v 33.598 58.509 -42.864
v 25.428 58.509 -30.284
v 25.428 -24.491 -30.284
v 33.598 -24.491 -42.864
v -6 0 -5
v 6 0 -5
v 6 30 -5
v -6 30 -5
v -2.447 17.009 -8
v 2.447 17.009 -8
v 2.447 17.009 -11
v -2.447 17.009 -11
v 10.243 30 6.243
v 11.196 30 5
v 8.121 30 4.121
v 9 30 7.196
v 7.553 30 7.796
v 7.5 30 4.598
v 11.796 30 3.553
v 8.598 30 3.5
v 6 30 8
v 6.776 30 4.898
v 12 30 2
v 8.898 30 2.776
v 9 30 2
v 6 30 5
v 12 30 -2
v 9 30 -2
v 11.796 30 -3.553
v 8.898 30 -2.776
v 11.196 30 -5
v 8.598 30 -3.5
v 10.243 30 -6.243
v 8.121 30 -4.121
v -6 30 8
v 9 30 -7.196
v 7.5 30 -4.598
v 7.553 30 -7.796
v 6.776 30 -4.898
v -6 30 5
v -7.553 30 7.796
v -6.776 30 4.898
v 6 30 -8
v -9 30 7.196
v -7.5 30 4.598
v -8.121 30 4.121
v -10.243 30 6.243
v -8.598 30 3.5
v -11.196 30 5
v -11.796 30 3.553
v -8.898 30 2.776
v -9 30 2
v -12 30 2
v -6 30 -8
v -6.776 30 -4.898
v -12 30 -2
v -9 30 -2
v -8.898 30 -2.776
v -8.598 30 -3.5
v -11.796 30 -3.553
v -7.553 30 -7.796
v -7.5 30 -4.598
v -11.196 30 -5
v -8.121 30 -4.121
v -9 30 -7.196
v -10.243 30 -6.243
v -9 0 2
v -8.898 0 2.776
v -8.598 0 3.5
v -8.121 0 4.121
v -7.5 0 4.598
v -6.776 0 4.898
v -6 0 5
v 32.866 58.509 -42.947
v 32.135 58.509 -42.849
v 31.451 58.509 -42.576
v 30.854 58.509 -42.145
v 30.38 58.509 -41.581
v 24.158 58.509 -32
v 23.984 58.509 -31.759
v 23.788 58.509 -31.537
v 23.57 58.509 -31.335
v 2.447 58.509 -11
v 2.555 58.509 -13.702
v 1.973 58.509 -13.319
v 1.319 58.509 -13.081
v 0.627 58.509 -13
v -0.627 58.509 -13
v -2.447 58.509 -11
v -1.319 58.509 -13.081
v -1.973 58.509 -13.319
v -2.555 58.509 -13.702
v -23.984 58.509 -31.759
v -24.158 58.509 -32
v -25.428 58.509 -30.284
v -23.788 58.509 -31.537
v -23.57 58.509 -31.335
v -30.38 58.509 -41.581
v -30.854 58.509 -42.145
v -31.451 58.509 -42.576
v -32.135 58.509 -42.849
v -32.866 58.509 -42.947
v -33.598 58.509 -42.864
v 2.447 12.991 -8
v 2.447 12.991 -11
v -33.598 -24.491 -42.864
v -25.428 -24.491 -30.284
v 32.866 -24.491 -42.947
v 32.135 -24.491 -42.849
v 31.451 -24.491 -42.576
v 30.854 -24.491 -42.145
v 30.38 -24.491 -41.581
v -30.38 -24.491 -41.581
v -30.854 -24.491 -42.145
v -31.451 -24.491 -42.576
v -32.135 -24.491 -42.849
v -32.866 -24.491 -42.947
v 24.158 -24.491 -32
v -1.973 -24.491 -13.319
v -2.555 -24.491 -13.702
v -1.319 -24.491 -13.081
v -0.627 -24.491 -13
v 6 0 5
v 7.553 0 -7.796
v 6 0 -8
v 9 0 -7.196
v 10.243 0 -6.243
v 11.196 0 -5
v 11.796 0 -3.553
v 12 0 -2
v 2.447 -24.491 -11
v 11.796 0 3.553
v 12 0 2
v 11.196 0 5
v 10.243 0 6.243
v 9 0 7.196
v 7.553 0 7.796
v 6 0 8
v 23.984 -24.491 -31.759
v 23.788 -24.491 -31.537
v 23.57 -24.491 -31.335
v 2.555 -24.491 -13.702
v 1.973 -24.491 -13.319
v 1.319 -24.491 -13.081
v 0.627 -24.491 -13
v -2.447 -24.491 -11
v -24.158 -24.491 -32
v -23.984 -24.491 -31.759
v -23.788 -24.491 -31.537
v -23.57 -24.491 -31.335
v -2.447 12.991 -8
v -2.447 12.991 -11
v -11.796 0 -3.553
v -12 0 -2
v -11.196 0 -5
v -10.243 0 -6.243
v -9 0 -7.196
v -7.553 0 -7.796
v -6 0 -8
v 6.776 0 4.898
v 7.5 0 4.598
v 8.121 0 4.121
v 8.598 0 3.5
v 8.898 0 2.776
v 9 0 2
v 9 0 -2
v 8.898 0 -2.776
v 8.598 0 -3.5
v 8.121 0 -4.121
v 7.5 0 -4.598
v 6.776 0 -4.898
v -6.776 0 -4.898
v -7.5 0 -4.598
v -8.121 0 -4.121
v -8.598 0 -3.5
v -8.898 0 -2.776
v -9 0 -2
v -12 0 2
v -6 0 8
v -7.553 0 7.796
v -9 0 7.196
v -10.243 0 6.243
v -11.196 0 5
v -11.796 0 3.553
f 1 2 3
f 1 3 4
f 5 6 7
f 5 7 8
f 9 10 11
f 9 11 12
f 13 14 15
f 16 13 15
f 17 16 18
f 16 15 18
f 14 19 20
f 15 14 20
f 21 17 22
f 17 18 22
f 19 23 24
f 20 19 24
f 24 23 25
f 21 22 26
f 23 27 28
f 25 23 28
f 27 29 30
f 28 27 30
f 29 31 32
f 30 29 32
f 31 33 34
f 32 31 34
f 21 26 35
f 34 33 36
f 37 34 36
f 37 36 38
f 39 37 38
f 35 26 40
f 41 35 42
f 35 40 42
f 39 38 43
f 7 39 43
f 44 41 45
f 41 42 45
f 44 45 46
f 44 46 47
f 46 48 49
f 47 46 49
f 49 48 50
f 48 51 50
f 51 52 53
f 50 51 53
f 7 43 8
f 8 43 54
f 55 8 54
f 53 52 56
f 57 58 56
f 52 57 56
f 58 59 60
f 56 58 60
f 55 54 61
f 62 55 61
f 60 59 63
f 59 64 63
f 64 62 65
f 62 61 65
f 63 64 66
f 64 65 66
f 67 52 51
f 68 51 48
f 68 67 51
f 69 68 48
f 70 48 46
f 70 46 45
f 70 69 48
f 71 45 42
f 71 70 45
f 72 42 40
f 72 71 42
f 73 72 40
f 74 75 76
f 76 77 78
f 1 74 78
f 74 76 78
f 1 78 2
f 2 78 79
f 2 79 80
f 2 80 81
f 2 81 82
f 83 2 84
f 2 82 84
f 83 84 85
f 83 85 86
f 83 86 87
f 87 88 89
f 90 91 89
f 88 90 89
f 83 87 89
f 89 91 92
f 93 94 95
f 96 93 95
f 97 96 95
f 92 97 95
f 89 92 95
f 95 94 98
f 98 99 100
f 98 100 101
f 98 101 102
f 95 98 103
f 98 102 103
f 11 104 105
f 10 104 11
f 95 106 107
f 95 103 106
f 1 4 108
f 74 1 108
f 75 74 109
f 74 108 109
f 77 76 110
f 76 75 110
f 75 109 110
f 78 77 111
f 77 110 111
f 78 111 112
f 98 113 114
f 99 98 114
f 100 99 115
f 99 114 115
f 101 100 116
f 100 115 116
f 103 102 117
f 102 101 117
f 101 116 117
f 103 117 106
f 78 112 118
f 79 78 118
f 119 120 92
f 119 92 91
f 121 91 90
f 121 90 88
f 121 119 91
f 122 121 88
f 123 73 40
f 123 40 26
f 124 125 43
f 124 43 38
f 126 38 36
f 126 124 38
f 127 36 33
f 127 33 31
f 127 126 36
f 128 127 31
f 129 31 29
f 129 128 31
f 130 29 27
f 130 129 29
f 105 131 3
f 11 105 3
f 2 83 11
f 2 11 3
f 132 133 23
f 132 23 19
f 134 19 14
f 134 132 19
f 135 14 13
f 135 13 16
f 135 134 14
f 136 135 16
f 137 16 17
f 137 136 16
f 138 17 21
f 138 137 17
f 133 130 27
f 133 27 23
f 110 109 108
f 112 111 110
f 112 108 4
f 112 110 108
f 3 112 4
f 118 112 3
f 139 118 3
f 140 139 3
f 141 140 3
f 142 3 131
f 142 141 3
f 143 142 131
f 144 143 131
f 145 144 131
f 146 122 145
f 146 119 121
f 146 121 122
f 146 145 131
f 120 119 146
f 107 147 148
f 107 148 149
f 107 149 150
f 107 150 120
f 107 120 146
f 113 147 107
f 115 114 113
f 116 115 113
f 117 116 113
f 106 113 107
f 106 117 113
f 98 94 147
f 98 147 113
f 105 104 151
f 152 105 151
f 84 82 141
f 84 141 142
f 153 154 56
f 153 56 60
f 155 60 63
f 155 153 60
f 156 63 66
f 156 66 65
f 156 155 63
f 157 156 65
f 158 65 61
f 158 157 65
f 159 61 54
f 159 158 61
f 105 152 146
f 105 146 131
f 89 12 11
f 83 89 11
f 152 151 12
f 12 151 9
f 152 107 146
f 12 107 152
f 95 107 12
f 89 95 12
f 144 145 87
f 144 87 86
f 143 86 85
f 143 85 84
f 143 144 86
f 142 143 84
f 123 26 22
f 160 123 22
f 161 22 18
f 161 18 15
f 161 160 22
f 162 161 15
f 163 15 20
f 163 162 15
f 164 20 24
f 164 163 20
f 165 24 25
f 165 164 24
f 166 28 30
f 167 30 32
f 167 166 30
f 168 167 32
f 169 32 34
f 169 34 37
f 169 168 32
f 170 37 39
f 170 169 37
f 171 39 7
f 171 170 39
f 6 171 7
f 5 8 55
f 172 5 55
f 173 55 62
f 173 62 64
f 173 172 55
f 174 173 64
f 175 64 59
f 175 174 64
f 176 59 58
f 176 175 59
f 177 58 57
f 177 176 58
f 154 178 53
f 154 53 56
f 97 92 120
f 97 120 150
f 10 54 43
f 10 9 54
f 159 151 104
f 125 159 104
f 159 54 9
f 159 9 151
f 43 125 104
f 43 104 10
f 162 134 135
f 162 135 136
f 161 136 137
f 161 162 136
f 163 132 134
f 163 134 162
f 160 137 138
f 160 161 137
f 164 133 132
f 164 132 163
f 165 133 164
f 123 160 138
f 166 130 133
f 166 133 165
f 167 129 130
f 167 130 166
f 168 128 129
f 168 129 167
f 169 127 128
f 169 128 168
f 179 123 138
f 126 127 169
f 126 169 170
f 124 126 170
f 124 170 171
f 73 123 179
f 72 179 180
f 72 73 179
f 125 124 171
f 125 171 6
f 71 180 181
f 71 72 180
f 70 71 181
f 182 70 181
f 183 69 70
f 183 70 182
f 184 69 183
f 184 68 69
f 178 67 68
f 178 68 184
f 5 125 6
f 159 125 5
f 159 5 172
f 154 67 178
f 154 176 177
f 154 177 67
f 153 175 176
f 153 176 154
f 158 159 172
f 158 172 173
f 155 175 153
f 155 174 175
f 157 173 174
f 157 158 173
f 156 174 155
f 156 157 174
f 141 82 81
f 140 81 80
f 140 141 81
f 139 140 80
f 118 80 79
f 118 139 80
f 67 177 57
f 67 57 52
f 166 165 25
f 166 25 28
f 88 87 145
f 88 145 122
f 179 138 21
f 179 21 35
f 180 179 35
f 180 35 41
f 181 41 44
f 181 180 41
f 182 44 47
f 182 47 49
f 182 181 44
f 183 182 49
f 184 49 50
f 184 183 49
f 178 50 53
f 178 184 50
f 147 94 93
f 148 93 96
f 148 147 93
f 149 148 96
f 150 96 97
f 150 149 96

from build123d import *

# Parameters (mm, degrees)
SALIENTE_EXTRUIR1_DEPTH = 30
CROQUIS3_W              = 4.89350096
CROQUIS3_H              = 4.01782184
SALIENTE_EXTRUIR2_DEPTH = 3
SALIENTE_EXTRUIR3_DEPTH = 41.5
REDONDEO2_R             = 3


with BuildPart() as part:
    # Croquis1 → Saliente-Extruir1 (new body)
    with BuildSketch(Plane(origin=(0, 0, 0), x_dir=(1, 0, 0), z_dir=(0, 1, 0))):
        with BuildLine():
            Line((-6, 8), (6, 8))
            ThreePointArc((6, 8), (10.242640687, 6.242640687), (12, 2))
            Line((12, 2), (12, -2))
            ThreePointArc((12, -2), (10.242640687, -6.242640687), (6, -8))
            Line((6, -8), (-6, -8))
            ThreePointArc((-6, -8), (-10.242640687, -6.242640687), (-12, -2))
            Line((-12, -2), (-12, 2))
            ThreePointArc((-12, 2), (-10.242640687, 6.242640687), (-6, 8))
        make_face()
        with BuildLine():
            Line((-6, -5), (6, -5))
            ThreePointArc((6, -5), (8.121320344, -4.121320344), (9, -2))
            Line((9, -2), (9, 2))
            ThreePointArc((9, 2), (8.121320344, 4.121320344), (6, 5))
            Line((6, 5), (-6, 5))
            ThreePointArc((-6, 5), (-8.121320344, 4.121320344), (-9, 2))
            Line((-9, 2), (-9, -2))
            ThreePointArc((-9, -2), (-8.121320344, -4.121320344), (-6, -5))
        make_face(mode=Mode.SUBTRACT)
    extrude(amount=SALIENTE_EXTRUIR1_DEPTH)

    # Croquis3 → Saliente-Extruir2 (add)
    with BuildSketch(Plane(origin=(0, 0, -8), x_dir=(-1, 0, 0), z_dir=(0, 0, -1))):
        with Locations((0, 15)):
            Rectangle(CROQUIS3_W, CROQUIS3_H)
    extrude(amount=SALIENTE_EXTRUIR2_DEPTH)

    # Croquis7 → Saliente-Extruir3 (add, symmetric)
    with BuildSketch(Plane(origin=(0, 17.00891092, 0), x_dir=(1, 0, 0), z_dir=(0, 1, 0))):
        Polygon((-2.44675048, 11), (2.44675048, 11), (25.428083774, 30.283628291), (33.597669299, 42.86368681), (31.920328163, 43.95296488), (23.913536336, 31.623586673), (1.718810011, 13), (-1.718810011, 13), (-23.913536336, 31.623586673), (-31.920328163, 43.95296488), (-33.597669299, 42.86368681), (-25.428083774, 30.283628291), align=None)
    extrude(amount=SALIENTE_EXTRUIR3_DEPTH, both=True)

    # Redondeo2
    # the kernel refuses this fillet: 3 mm, written as the material it adds along each edge
    with BuildSketch(Plane(origin=(-23.913536336, -24.49108908, -31.623586673), x_dir=(0.7660444431189832, 0, 0.6427876096865331), z_dir=(0, 1, 0)), Plane(origin=(23.913536336, -24.49108908, -31.623586673), x_dir=(0.5446390350150309, 0, -0.8386705679454215), z_dir=(0, 1, 0))) as redondeo2_piece_1:
        with BuildLine():
            CenterArc((REDONDEO2_R * 0.149451001349, REDONDEO2_R), REDONDEO2_R, 253, 17)
            Line((-REDONDEO2_R * 0.142920703374, REDONDEO2_R * 0.043695244037), (0, 0))
            Line((0, 0), (REDONDEO2_R * 0.149451001349, 0))
        make_face()
    extrude(amount=83)
    with BuildSketch(Plane(origin=(1.718810011, -24.49108908, -13), x_dir=(0.7660444431189833, 0, -0.6427876096865328), z_dir=(0, 1, 0)), Plane(origin=(-1.718810011, -24.49108908, -13), x_dir=(1, 0, 0), z_dir=(0, 1, 0))) as redondeo2_piece_2:
        with BuildLine():
            CenterArc((REDONDEO2_R * 0.363970234266, REDONDEO2_R), REDONDEO2_R, 230, 40)
            Line((-REDONDEO2_R * 0.27881737542, REDONDEO2_R * 0.233955556881), (0, 0))
            Line((0, 0), (REDONDEO2_R * 0.363970234266, 0))
        make_face()
    extrude(amount=83)
    # the kernel refuses this fillet: 3 mm, written as the material it takes off along each edge
    with BuildSketch(Plane(origin=(31.920328163, -31.562156891, -43.95296488), x_dir=(0.8386705679454225, 0, 0.5446390350150296), z_dir=(0, 1, 0))) as redondeo2_2_piece_1:
        with BuildLine():
            CenterArc((3, -2.828427125), REDONDEO2_R, 109.471220634, 70.528779366)
            Line((0, -2.828427125), (0, 0))
            Line((0, 0), (2, 0))
        make_face()
    extrude(amount=97.142135624, mode=Mode.SUBTRACT)
    with BuildSketch(Plane(origin=(-31.920328163, -31.562156891, -43.95296488), x_dir=(0.5446390350150306, 0, 0.8386705679454217), z_dir=(0, 1, 0))) as redondeo2_2_piece_2:
        with BuildLine():
            CenterArc((2.828427125, -3), REDONDEO2_R, 90, 70.528779366)
            Line((0, -2), (0, 0))
            Line((0, 0), (2.828427125, 0))
        make_face()
    extrude(amount=97.142135624, mode=Mode.SUBTRACT)


solid = part.part
